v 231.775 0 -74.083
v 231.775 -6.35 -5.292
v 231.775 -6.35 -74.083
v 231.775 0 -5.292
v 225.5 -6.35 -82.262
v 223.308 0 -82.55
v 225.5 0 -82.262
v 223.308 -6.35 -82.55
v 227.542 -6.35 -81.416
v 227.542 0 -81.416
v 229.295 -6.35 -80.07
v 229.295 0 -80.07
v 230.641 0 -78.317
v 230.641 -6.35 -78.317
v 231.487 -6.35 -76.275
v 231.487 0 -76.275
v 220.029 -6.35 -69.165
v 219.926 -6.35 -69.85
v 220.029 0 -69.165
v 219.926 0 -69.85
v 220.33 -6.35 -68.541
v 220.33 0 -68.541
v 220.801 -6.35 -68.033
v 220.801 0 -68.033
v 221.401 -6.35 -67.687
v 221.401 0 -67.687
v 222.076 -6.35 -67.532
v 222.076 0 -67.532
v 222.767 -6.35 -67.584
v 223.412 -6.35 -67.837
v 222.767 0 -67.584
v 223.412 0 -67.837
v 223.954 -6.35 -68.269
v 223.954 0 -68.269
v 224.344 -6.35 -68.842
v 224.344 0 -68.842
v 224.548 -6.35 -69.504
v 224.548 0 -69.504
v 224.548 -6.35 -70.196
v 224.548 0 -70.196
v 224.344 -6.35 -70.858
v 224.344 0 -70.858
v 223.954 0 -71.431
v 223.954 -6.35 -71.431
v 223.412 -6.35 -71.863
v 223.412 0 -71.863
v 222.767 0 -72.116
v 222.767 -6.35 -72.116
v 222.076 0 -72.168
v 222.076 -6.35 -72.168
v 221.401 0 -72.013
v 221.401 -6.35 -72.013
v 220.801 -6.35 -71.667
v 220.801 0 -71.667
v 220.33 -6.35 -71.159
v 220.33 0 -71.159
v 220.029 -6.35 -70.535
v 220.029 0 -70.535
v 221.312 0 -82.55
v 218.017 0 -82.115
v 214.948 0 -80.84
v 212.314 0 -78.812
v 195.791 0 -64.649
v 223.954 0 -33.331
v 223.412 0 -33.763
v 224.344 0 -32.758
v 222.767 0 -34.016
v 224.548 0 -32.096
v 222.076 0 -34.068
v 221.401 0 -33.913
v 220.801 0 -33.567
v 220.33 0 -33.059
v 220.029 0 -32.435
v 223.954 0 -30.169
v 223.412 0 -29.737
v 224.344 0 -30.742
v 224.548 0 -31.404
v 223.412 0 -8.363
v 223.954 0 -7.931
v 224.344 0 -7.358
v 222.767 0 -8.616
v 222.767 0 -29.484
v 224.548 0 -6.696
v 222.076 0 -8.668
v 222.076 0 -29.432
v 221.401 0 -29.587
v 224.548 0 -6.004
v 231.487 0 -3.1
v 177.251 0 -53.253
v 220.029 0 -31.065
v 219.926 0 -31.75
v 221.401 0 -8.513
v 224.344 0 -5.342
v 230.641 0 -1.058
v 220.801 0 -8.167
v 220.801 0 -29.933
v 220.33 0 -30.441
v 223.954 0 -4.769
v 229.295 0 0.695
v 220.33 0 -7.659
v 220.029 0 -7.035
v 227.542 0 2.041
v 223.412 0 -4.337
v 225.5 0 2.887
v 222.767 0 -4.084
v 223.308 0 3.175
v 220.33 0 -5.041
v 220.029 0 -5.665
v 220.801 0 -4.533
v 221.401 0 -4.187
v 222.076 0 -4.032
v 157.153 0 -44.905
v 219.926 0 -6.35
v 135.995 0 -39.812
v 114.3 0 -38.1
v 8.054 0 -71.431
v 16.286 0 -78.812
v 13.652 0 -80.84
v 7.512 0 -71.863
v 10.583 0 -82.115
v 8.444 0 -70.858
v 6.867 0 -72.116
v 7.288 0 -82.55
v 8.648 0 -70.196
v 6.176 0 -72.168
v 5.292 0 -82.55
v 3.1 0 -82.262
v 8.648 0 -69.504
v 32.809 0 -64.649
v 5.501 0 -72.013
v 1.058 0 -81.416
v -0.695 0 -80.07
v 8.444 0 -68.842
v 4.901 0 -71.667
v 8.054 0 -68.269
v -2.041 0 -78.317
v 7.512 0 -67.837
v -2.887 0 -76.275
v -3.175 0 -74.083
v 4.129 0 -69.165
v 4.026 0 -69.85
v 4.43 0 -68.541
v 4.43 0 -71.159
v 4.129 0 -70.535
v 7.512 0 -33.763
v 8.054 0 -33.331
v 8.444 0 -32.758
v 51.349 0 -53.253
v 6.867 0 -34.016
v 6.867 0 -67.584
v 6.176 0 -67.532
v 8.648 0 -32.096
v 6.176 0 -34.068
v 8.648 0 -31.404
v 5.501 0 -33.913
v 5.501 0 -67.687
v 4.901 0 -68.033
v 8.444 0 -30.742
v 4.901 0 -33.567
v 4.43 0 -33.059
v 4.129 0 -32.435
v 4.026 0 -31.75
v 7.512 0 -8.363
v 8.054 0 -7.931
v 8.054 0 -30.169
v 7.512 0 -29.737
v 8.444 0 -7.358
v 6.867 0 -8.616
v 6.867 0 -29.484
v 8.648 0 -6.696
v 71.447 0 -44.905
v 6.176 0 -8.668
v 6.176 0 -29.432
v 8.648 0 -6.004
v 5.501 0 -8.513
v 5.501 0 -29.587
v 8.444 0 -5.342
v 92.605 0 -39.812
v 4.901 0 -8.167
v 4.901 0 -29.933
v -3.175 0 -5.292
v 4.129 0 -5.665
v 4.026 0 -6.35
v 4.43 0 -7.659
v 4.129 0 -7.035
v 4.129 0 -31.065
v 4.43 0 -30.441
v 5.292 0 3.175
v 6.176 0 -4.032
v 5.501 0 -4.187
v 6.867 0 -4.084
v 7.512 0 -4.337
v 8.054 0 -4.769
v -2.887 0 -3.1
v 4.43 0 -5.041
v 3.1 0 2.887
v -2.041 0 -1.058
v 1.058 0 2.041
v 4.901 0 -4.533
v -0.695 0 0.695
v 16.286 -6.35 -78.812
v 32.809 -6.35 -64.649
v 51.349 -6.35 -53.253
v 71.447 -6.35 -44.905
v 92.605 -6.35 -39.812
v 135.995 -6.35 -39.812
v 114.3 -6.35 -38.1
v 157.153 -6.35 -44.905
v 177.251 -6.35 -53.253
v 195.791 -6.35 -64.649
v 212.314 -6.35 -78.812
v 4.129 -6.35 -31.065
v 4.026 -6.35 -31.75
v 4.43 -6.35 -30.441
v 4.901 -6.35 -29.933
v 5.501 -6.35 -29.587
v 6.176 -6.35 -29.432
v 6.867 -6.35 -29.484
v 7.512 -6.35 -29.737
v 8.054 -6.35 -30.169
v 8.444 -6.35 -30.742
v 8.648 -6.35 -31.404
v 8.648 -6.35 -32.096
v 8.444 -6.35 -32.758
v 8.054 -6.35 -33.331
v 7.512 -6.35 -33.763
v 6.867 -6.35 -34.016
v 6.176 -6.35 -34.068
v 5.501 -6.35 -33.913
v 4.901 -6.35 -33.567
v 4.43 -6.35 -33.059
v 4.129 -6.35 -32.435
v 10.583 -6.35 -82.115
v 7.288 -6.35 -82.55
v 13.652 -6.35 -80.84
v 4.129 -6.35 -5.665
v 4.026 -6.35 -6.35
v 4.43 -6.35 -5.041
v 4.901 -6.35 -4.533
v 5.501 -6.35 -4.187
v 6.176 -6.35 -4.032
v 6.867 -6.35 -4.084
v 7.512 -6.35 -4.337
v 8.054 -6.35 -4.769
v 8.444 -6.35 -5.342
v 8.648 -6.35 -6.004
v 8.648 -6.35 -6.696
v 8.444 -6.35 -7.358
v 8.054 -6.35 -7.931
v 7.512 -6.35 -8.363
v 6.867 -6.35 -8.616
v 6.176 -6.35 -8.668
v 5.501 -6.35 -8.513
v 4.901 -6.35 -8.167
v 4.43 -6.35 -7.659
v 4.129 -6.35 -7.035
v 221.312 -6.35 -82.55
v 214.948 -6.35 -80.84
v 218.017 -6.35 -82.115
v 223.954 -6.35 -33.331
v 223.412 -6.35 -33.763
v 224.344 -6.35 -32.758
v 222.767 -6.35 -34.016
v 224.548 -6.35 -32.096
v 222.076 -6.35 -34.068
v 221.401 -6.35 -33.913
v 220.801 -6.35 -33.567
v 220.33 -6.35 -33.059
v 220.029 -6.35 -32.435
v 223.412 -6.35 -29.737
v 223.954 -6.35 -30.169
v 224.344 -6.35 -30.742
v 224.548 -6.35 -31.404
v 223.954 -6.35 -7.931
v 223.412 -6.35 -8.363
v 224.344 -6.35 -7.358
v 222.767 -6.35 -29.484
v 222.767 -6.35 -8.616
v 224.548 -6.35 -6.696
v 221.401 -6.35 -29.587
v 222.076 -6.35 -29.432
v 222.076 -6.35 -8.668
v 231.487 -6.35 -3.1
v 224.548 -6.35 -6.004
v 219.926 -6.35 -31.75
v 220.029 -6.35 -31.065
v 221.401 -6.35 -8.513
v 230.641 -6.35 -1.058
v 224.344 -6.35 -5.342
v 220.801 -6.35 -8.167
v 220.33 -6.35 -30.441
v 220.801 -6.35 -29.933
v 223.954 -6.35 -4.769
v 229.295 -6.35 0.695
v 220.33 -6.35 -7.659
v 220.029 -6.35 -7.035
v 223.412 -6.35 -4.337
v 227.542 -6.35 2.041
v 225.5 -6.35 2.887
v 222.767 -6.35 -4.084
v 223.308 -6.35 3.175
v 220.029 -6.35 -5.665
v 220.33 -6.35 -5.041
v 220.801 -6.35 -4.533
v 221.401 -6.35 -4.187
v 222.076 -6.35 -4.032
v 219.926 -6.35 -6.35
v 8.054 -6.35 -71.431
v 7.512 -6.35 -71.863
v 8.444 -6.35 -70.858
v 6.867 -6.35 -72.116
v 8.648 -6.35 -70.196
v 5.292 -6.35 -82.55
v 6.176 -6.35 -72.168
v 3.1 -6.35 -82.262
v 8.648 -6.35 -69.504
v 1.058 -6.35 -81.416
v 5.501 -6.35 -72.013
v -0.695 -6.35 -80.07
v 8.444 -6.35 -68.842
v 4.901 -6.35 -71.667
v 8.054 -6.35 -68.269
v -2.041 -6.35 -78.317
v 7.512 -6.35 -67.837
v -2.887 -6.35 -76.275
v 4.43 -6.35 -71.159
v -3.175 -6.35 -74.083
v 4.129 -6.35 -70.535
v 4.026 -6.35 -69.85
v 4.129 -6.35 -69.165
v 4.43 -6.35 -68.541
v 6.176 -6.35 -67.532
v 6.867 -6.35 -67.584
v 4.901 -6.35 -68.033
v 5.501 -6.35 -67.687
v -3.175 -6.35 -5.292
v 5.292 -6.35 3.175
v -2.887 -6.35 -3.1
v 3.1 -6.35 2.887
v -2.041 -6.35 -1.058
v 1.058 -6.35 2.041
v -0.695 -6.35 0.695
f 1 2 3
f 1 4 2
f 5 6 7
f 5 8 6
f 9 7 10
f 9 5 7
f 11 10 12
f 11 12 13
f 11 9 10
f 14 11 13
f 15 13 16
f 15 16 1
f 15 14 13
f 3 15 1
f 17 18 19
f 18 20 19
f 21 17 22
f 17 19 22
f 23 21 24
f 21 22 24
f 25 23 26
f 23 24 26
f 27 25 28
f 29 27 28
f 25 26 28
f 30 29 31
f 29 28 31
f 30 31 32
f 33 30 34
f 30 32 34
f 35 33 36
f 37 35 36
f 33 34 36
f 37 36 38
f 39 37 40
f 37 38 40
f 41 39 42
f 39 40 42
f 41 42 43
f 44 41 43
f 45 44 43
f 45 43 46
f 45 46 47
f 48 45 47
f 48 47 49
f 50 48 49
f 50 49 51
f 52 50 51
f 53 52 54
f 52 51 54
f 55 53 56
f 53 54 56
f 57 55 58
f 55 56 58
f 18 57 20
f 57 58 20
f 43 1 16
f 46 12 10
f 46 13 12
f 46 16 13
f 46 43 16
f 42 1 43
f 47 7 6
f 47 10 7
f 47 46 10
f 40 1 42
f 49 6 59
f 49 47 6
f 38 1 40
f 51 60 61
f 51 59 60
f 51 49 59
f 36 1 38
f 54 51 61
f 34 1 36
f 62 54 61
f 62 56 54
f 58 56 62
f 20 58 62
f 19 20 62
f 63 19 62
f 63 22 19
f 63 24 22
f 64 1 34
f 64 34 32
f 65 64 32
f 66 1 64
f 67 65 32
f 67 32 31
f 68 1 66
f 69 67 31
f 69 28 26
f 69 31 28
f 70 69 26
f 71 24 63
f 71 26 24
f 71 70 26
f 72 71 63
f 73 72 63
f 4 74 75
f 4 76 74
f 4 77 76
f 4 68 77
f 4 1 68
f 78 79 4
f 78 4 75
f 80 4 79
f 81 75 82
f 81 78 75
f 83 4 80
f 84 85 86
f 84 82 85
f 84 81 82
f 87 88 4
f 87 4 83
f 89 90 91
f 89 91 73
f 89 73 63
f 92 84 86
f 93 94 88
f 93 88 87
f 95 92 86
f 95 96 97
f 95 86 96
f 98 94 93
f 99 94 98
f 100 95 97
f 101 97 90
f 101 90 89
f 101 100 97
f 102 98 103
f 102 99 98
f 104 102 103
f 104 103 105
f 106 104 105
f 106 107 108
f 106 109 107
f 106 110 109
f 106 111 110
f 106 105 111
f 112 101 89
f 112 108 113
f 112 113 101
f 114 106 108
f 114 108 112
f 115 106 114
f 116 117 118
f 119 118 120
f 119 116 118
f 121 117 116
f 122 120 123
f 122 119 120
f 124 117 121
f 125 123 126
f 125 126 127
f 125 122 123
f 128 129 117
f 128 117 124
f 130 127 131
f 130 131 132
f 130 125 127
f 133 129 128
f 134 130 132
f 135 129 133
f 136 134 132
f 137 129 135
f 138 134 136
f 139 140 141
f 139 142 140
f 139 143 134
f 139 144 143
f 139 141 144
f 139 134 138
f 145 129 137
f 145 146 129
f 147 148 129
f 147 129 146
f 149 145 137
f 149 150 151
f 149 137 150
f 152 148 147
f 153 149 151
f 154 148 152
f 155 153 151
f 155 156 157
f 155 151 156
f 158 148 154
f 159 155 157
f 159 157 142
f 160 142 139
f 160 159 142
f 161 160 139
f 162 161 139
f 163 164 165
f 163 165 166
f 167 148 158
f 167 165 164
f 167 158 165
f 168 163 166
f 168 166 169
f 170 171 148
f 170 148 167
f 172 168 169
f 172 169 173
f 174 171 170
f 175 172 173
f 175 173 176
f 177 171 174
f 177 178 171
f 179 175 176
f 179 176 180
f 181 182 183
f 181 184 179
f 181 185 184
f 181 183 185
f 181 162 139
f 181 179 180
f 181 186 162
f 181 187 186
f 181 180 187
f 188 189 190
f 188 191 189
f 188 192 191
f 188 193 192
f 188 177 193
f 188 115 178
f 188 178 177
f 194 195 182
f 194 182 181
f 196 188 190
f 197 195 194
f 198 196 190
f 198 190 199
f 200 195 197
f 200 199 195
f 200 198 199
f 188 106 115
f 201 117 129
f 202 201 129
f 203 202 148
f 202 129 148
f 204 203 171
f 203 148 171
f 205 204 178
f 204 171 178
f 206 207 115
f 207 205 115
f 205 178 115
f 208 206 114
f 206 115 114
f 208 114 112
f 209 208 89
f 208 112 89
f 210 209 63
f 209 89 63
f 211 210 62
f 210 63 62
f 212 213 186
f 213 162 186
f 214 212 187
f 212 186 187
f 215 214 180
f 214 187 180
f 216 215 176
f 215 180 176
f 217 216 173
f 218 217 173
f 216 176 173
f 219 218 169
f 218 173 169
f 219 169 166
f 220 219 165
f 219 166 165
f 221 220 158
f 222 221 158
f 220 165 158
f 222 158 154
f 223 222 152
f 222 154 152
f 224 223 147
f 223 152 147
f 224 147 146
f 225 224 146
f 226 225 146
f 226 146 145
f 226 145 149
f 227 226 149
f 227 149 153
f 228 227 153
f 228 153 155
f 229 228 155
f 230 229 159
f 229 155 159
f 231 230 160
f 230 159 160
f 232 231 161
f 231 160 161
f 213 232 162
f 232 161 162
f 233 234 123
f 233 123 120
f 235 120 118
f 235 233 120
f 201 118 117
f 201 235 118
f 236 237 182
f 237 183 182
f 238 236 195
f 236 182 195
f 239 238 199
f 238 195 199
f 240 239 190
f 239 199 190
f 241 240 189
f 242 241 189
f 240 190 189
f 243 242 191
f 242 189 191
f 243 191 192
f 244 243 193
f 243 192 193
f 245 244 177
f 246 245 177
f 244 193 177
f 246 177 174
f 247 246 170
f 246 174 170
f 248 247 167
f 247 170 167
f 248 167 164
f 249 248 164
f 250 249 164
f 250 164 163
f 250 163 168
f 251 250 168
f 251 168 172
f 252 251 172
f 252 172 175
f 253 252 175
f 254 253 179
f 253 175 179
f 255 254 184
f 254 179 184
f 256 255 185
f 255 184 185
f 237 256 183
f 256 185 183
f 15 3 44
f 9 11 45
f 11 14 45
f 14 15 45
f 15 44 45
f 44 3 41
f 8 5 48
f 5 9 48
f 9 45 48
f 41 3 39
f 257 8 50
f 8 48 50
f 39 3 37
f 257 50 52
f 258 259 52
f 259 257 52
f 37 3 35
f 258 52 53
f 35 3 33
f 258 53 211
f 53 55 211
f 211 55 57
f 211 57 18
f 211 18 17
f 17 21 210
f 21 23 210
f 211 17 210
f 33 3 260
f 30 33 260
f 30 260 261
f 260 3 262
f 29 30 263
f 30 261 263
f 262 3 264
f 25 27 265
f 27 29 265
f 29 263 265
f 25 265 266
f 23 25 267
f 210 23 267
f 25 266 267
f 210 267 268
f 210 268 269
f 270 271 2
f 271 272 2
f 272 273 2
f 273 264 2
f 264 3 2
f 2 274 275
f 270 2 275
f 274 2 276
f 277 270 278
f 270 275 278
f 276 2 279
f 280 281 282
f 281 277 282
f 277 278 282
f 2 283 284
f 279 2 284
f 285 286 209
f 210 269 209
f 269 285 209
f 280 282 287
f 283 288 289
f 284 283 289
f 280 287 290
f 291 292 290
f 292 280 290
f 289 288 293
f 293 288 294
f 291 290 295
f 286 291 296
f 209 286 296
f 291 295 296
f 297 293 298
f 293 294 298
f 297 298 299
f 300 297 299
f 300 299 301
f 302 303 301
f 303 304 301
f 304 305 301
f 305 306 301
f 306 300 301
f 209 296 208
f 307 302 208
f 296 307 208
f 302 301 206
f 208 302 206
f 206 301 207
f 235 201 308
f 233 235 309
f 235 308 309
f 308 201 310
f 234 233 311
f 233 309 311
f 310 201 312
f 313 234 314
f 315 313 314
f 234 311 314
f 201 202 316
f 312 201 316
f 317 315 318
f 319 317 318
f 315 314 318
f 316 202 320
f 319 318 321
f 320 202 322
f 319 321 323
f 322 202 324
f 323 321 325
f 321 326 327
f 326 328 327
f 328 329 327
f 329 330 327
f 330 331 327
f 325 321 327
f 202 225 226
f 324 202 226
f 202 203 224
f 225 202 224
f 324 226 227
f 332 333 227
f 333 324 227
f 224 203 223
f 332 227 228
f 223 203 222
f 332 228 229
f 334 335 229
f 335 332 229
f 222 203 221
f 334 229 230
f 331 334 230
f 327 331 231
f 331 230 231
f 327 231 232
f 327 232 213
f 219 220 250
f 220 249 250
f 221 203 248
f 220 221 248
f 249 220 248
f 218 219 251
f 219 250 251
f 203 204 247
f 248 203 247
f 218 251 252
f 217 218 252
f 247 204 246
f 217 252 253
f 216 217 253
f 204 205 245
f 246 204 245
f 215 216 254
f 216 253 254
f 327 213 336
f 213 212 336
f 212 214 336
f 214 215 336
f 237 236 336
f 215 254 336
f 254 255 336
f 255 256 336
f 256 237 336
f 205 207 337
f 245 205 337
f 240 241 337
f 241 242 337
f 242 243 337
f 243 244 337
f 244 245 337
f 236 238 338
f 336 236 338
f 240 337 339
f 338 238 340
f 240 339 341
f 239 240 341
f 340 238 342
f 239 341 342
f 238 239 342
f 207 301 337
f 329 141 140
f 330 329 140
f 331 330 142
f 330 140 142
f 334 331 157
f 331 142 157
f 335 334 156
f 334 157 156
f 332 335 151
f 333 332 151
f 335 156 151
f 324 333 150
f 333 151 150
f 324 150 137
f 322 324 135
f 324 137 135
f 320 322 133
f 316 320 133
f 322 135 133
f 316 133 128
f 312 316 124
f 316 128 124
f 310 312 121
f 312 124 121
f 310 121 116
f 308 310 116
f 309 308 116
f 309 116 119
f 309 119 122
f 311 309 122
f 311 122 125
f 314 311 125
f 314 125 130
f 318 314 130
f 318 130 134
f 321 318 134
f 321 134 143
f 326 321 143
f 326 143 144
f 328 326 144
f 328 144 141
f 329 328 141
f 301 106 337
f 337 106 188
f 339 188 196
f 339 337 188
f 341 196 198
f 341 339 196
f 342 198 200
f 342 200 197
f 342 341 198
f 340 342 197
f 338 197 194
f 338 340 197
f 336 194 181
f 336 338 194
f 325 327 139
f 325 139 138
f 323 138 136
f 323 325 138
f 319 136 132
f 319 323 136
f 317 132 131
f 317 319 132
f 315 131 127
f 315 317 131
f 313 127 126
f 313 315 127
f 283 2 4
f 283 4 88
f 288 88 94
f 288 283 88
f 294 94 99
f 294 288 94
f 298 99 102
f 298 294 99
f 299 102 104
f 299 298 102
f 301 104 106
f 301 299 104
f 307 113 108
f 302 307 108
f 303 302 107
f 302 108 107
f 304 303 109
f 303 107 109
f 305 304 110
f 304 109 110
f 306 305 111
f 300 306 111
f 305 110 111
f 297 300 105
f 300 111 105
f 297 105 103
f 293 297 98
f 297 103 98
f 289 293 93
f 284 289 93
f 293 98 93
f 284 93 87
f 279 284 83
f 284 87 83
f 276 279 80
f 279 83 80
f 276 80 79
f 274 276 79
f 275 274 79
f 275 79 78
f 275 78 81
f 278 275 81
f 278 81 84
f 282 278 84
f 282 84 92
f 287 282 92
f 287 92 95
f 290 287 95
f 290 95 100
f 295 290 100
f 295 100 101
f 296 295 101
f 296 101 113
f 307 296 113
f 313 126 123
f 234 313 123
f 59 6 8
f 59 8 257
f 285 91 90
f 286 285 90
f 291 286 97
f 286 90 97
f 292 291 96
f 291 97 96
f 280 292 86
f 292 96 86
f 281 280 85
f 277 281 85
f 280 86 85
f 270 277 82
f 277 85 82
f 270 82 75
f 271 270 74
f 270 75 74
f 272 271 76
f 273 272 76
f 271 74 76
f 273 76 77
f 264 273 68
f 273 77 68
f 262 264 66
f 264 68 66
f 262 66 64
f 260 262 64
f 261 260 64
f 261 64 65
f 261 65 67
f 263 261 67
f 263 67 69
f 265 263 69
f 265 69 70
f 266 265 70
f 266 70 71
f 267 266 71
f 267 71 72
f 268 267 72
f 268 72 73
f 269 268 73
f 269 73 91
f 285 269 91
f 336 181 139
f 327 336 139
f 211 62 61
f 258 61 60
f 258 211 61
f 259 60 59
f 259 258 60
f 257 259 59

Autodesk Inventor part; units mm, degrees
ref_plane "YZ Plane" through (0, 0, 0) normal (1, 0, 0) x (0, 1, 0)
ref_plane "XZ Plane" through (0, 0, 0) normal (0, 1, 0) x (-1, 0, 0)
ref_plane "XY Plane" through (0, 0, 0) normal (0, 0, 1) x (1, 0, 0)
sketch "Sketch1" plane through (0, 0, 0) normal (0, 1, 0) x (-1, 0, 0)
  line L0 (0, 0) -> (-228.6, 0)
  line L1 (-228.6, 0) -> (-228.6, -82.55)
  line L2 (0, 0) -> (0, -82.55)
  line L3 (-228.6, 0) -> (-222.25, 0)
  circle A0 centre (-222.25, -6.35) radius 2.3241
  circle A1 centre (-222.25, -31.75) radius 2.3241
  line L4 (-228.6, 0) -> (-114.3, 0)
  line L5 (-114.3, 0) -> (-114.3, 9.4502)
  circle A2 centre (-222.25, -69.85) radius 2.3241
  circle A3 centre (-6.35, -6.35) radius 2.3241
  circle A4 centre (-6.35, -31.75) radius 2.3241
  circle A5 centre (-6.35, -69.85) radius 2.3241
  line L6 (-228.6, -82.55) -> (-215.9, -82.55)
  line L7 (0, -82.55) -> (-12.7, -82.55)
  line L8 (-114.3, 0) -> (-114.3, -38.1)
  arc A6 (-12.7, -82.55) -> (-215.9, -82.55) centre (-114.3, -176.4393) ccw
  line L9 (-228.6, 0) -> (-231.775, 0)
  line L10 (-231.775, 0) -> (-231.775, -82.55)
  line L11 (-231.775, -82.55) -> (-228.6, -82.55)
  line L12 (-228.6, 0) -> (-228.6, 3.175)
  line L13 (-228.6, 3.175) -> (-231.775, 3.175)
  line L14 (-231.775, 3.175) -> (-231.775, 0)
  line L15 (-228.6, 3.175) -> (0, 3.175)
  line L16 (0, 3.175) -> (0, 0)
  line L17 (0, 0) -> (3.175, 0)
  line L18 (3.175, 0) -> (3.175, 3.175)
  line L19 (3.175, 3.175) -> (0, 3.175)
  line L20 (3.175, 0) -> (3.175, -82.55)
  line L21 (3.175, -82.55) -> (0, -82.55)
  point P0 (-225.425, 0)
  dimension "d0" = 228.6
  dimension "d1" = 82.55
  dimension "d2" = 6.35
  dimension "d4" = 4.6482
  dimension "d6" = 4.6482
  dimension "d7" = 114.3
  dimension "d9" = 4.6482
  dimension "d10" = 6.35
  dimension "d11" = 31.75
  dimension "d12" = 69.85
  dimension "d14" = 12.7
  dimension "d15" = 12.7
  dimension "d16" = 38.1
  dimension "d20" = 3.175
  dimension "d21" = 3.175
  dimension "d22" = 3.175
extrude "Extrusion1" add sketch "Sketch1" against normal blind 3.175 contours L2 L7 A6 L8 L0 | L8 A6 L6 L1 L0
fillet "Fillet1" radius 8.4667 4 edges at (228.6, -1.5875, -82.55) (215.9, -1.5875, -82.55) (12.7, -1.5875, -82.55) (0, -1.5875, -82.55)
extrude "Extrusion2" add sketch "Sketch1" against normal blind 6.35
fillet "Fillet2" radius 8.4667 4 edges at (231.775, -3.175, -82.55) (231.775, -3.175, 3.175) (-3.175, -3.175, 3.175) (-3.175, -3.175, -82.55)
fillet "Fillet3" radius 12.7 2 edges at (215.9, -3.175, -82.55) (12.7, -3.175, -82.55)
properties part number "Intake (Plastic)"
